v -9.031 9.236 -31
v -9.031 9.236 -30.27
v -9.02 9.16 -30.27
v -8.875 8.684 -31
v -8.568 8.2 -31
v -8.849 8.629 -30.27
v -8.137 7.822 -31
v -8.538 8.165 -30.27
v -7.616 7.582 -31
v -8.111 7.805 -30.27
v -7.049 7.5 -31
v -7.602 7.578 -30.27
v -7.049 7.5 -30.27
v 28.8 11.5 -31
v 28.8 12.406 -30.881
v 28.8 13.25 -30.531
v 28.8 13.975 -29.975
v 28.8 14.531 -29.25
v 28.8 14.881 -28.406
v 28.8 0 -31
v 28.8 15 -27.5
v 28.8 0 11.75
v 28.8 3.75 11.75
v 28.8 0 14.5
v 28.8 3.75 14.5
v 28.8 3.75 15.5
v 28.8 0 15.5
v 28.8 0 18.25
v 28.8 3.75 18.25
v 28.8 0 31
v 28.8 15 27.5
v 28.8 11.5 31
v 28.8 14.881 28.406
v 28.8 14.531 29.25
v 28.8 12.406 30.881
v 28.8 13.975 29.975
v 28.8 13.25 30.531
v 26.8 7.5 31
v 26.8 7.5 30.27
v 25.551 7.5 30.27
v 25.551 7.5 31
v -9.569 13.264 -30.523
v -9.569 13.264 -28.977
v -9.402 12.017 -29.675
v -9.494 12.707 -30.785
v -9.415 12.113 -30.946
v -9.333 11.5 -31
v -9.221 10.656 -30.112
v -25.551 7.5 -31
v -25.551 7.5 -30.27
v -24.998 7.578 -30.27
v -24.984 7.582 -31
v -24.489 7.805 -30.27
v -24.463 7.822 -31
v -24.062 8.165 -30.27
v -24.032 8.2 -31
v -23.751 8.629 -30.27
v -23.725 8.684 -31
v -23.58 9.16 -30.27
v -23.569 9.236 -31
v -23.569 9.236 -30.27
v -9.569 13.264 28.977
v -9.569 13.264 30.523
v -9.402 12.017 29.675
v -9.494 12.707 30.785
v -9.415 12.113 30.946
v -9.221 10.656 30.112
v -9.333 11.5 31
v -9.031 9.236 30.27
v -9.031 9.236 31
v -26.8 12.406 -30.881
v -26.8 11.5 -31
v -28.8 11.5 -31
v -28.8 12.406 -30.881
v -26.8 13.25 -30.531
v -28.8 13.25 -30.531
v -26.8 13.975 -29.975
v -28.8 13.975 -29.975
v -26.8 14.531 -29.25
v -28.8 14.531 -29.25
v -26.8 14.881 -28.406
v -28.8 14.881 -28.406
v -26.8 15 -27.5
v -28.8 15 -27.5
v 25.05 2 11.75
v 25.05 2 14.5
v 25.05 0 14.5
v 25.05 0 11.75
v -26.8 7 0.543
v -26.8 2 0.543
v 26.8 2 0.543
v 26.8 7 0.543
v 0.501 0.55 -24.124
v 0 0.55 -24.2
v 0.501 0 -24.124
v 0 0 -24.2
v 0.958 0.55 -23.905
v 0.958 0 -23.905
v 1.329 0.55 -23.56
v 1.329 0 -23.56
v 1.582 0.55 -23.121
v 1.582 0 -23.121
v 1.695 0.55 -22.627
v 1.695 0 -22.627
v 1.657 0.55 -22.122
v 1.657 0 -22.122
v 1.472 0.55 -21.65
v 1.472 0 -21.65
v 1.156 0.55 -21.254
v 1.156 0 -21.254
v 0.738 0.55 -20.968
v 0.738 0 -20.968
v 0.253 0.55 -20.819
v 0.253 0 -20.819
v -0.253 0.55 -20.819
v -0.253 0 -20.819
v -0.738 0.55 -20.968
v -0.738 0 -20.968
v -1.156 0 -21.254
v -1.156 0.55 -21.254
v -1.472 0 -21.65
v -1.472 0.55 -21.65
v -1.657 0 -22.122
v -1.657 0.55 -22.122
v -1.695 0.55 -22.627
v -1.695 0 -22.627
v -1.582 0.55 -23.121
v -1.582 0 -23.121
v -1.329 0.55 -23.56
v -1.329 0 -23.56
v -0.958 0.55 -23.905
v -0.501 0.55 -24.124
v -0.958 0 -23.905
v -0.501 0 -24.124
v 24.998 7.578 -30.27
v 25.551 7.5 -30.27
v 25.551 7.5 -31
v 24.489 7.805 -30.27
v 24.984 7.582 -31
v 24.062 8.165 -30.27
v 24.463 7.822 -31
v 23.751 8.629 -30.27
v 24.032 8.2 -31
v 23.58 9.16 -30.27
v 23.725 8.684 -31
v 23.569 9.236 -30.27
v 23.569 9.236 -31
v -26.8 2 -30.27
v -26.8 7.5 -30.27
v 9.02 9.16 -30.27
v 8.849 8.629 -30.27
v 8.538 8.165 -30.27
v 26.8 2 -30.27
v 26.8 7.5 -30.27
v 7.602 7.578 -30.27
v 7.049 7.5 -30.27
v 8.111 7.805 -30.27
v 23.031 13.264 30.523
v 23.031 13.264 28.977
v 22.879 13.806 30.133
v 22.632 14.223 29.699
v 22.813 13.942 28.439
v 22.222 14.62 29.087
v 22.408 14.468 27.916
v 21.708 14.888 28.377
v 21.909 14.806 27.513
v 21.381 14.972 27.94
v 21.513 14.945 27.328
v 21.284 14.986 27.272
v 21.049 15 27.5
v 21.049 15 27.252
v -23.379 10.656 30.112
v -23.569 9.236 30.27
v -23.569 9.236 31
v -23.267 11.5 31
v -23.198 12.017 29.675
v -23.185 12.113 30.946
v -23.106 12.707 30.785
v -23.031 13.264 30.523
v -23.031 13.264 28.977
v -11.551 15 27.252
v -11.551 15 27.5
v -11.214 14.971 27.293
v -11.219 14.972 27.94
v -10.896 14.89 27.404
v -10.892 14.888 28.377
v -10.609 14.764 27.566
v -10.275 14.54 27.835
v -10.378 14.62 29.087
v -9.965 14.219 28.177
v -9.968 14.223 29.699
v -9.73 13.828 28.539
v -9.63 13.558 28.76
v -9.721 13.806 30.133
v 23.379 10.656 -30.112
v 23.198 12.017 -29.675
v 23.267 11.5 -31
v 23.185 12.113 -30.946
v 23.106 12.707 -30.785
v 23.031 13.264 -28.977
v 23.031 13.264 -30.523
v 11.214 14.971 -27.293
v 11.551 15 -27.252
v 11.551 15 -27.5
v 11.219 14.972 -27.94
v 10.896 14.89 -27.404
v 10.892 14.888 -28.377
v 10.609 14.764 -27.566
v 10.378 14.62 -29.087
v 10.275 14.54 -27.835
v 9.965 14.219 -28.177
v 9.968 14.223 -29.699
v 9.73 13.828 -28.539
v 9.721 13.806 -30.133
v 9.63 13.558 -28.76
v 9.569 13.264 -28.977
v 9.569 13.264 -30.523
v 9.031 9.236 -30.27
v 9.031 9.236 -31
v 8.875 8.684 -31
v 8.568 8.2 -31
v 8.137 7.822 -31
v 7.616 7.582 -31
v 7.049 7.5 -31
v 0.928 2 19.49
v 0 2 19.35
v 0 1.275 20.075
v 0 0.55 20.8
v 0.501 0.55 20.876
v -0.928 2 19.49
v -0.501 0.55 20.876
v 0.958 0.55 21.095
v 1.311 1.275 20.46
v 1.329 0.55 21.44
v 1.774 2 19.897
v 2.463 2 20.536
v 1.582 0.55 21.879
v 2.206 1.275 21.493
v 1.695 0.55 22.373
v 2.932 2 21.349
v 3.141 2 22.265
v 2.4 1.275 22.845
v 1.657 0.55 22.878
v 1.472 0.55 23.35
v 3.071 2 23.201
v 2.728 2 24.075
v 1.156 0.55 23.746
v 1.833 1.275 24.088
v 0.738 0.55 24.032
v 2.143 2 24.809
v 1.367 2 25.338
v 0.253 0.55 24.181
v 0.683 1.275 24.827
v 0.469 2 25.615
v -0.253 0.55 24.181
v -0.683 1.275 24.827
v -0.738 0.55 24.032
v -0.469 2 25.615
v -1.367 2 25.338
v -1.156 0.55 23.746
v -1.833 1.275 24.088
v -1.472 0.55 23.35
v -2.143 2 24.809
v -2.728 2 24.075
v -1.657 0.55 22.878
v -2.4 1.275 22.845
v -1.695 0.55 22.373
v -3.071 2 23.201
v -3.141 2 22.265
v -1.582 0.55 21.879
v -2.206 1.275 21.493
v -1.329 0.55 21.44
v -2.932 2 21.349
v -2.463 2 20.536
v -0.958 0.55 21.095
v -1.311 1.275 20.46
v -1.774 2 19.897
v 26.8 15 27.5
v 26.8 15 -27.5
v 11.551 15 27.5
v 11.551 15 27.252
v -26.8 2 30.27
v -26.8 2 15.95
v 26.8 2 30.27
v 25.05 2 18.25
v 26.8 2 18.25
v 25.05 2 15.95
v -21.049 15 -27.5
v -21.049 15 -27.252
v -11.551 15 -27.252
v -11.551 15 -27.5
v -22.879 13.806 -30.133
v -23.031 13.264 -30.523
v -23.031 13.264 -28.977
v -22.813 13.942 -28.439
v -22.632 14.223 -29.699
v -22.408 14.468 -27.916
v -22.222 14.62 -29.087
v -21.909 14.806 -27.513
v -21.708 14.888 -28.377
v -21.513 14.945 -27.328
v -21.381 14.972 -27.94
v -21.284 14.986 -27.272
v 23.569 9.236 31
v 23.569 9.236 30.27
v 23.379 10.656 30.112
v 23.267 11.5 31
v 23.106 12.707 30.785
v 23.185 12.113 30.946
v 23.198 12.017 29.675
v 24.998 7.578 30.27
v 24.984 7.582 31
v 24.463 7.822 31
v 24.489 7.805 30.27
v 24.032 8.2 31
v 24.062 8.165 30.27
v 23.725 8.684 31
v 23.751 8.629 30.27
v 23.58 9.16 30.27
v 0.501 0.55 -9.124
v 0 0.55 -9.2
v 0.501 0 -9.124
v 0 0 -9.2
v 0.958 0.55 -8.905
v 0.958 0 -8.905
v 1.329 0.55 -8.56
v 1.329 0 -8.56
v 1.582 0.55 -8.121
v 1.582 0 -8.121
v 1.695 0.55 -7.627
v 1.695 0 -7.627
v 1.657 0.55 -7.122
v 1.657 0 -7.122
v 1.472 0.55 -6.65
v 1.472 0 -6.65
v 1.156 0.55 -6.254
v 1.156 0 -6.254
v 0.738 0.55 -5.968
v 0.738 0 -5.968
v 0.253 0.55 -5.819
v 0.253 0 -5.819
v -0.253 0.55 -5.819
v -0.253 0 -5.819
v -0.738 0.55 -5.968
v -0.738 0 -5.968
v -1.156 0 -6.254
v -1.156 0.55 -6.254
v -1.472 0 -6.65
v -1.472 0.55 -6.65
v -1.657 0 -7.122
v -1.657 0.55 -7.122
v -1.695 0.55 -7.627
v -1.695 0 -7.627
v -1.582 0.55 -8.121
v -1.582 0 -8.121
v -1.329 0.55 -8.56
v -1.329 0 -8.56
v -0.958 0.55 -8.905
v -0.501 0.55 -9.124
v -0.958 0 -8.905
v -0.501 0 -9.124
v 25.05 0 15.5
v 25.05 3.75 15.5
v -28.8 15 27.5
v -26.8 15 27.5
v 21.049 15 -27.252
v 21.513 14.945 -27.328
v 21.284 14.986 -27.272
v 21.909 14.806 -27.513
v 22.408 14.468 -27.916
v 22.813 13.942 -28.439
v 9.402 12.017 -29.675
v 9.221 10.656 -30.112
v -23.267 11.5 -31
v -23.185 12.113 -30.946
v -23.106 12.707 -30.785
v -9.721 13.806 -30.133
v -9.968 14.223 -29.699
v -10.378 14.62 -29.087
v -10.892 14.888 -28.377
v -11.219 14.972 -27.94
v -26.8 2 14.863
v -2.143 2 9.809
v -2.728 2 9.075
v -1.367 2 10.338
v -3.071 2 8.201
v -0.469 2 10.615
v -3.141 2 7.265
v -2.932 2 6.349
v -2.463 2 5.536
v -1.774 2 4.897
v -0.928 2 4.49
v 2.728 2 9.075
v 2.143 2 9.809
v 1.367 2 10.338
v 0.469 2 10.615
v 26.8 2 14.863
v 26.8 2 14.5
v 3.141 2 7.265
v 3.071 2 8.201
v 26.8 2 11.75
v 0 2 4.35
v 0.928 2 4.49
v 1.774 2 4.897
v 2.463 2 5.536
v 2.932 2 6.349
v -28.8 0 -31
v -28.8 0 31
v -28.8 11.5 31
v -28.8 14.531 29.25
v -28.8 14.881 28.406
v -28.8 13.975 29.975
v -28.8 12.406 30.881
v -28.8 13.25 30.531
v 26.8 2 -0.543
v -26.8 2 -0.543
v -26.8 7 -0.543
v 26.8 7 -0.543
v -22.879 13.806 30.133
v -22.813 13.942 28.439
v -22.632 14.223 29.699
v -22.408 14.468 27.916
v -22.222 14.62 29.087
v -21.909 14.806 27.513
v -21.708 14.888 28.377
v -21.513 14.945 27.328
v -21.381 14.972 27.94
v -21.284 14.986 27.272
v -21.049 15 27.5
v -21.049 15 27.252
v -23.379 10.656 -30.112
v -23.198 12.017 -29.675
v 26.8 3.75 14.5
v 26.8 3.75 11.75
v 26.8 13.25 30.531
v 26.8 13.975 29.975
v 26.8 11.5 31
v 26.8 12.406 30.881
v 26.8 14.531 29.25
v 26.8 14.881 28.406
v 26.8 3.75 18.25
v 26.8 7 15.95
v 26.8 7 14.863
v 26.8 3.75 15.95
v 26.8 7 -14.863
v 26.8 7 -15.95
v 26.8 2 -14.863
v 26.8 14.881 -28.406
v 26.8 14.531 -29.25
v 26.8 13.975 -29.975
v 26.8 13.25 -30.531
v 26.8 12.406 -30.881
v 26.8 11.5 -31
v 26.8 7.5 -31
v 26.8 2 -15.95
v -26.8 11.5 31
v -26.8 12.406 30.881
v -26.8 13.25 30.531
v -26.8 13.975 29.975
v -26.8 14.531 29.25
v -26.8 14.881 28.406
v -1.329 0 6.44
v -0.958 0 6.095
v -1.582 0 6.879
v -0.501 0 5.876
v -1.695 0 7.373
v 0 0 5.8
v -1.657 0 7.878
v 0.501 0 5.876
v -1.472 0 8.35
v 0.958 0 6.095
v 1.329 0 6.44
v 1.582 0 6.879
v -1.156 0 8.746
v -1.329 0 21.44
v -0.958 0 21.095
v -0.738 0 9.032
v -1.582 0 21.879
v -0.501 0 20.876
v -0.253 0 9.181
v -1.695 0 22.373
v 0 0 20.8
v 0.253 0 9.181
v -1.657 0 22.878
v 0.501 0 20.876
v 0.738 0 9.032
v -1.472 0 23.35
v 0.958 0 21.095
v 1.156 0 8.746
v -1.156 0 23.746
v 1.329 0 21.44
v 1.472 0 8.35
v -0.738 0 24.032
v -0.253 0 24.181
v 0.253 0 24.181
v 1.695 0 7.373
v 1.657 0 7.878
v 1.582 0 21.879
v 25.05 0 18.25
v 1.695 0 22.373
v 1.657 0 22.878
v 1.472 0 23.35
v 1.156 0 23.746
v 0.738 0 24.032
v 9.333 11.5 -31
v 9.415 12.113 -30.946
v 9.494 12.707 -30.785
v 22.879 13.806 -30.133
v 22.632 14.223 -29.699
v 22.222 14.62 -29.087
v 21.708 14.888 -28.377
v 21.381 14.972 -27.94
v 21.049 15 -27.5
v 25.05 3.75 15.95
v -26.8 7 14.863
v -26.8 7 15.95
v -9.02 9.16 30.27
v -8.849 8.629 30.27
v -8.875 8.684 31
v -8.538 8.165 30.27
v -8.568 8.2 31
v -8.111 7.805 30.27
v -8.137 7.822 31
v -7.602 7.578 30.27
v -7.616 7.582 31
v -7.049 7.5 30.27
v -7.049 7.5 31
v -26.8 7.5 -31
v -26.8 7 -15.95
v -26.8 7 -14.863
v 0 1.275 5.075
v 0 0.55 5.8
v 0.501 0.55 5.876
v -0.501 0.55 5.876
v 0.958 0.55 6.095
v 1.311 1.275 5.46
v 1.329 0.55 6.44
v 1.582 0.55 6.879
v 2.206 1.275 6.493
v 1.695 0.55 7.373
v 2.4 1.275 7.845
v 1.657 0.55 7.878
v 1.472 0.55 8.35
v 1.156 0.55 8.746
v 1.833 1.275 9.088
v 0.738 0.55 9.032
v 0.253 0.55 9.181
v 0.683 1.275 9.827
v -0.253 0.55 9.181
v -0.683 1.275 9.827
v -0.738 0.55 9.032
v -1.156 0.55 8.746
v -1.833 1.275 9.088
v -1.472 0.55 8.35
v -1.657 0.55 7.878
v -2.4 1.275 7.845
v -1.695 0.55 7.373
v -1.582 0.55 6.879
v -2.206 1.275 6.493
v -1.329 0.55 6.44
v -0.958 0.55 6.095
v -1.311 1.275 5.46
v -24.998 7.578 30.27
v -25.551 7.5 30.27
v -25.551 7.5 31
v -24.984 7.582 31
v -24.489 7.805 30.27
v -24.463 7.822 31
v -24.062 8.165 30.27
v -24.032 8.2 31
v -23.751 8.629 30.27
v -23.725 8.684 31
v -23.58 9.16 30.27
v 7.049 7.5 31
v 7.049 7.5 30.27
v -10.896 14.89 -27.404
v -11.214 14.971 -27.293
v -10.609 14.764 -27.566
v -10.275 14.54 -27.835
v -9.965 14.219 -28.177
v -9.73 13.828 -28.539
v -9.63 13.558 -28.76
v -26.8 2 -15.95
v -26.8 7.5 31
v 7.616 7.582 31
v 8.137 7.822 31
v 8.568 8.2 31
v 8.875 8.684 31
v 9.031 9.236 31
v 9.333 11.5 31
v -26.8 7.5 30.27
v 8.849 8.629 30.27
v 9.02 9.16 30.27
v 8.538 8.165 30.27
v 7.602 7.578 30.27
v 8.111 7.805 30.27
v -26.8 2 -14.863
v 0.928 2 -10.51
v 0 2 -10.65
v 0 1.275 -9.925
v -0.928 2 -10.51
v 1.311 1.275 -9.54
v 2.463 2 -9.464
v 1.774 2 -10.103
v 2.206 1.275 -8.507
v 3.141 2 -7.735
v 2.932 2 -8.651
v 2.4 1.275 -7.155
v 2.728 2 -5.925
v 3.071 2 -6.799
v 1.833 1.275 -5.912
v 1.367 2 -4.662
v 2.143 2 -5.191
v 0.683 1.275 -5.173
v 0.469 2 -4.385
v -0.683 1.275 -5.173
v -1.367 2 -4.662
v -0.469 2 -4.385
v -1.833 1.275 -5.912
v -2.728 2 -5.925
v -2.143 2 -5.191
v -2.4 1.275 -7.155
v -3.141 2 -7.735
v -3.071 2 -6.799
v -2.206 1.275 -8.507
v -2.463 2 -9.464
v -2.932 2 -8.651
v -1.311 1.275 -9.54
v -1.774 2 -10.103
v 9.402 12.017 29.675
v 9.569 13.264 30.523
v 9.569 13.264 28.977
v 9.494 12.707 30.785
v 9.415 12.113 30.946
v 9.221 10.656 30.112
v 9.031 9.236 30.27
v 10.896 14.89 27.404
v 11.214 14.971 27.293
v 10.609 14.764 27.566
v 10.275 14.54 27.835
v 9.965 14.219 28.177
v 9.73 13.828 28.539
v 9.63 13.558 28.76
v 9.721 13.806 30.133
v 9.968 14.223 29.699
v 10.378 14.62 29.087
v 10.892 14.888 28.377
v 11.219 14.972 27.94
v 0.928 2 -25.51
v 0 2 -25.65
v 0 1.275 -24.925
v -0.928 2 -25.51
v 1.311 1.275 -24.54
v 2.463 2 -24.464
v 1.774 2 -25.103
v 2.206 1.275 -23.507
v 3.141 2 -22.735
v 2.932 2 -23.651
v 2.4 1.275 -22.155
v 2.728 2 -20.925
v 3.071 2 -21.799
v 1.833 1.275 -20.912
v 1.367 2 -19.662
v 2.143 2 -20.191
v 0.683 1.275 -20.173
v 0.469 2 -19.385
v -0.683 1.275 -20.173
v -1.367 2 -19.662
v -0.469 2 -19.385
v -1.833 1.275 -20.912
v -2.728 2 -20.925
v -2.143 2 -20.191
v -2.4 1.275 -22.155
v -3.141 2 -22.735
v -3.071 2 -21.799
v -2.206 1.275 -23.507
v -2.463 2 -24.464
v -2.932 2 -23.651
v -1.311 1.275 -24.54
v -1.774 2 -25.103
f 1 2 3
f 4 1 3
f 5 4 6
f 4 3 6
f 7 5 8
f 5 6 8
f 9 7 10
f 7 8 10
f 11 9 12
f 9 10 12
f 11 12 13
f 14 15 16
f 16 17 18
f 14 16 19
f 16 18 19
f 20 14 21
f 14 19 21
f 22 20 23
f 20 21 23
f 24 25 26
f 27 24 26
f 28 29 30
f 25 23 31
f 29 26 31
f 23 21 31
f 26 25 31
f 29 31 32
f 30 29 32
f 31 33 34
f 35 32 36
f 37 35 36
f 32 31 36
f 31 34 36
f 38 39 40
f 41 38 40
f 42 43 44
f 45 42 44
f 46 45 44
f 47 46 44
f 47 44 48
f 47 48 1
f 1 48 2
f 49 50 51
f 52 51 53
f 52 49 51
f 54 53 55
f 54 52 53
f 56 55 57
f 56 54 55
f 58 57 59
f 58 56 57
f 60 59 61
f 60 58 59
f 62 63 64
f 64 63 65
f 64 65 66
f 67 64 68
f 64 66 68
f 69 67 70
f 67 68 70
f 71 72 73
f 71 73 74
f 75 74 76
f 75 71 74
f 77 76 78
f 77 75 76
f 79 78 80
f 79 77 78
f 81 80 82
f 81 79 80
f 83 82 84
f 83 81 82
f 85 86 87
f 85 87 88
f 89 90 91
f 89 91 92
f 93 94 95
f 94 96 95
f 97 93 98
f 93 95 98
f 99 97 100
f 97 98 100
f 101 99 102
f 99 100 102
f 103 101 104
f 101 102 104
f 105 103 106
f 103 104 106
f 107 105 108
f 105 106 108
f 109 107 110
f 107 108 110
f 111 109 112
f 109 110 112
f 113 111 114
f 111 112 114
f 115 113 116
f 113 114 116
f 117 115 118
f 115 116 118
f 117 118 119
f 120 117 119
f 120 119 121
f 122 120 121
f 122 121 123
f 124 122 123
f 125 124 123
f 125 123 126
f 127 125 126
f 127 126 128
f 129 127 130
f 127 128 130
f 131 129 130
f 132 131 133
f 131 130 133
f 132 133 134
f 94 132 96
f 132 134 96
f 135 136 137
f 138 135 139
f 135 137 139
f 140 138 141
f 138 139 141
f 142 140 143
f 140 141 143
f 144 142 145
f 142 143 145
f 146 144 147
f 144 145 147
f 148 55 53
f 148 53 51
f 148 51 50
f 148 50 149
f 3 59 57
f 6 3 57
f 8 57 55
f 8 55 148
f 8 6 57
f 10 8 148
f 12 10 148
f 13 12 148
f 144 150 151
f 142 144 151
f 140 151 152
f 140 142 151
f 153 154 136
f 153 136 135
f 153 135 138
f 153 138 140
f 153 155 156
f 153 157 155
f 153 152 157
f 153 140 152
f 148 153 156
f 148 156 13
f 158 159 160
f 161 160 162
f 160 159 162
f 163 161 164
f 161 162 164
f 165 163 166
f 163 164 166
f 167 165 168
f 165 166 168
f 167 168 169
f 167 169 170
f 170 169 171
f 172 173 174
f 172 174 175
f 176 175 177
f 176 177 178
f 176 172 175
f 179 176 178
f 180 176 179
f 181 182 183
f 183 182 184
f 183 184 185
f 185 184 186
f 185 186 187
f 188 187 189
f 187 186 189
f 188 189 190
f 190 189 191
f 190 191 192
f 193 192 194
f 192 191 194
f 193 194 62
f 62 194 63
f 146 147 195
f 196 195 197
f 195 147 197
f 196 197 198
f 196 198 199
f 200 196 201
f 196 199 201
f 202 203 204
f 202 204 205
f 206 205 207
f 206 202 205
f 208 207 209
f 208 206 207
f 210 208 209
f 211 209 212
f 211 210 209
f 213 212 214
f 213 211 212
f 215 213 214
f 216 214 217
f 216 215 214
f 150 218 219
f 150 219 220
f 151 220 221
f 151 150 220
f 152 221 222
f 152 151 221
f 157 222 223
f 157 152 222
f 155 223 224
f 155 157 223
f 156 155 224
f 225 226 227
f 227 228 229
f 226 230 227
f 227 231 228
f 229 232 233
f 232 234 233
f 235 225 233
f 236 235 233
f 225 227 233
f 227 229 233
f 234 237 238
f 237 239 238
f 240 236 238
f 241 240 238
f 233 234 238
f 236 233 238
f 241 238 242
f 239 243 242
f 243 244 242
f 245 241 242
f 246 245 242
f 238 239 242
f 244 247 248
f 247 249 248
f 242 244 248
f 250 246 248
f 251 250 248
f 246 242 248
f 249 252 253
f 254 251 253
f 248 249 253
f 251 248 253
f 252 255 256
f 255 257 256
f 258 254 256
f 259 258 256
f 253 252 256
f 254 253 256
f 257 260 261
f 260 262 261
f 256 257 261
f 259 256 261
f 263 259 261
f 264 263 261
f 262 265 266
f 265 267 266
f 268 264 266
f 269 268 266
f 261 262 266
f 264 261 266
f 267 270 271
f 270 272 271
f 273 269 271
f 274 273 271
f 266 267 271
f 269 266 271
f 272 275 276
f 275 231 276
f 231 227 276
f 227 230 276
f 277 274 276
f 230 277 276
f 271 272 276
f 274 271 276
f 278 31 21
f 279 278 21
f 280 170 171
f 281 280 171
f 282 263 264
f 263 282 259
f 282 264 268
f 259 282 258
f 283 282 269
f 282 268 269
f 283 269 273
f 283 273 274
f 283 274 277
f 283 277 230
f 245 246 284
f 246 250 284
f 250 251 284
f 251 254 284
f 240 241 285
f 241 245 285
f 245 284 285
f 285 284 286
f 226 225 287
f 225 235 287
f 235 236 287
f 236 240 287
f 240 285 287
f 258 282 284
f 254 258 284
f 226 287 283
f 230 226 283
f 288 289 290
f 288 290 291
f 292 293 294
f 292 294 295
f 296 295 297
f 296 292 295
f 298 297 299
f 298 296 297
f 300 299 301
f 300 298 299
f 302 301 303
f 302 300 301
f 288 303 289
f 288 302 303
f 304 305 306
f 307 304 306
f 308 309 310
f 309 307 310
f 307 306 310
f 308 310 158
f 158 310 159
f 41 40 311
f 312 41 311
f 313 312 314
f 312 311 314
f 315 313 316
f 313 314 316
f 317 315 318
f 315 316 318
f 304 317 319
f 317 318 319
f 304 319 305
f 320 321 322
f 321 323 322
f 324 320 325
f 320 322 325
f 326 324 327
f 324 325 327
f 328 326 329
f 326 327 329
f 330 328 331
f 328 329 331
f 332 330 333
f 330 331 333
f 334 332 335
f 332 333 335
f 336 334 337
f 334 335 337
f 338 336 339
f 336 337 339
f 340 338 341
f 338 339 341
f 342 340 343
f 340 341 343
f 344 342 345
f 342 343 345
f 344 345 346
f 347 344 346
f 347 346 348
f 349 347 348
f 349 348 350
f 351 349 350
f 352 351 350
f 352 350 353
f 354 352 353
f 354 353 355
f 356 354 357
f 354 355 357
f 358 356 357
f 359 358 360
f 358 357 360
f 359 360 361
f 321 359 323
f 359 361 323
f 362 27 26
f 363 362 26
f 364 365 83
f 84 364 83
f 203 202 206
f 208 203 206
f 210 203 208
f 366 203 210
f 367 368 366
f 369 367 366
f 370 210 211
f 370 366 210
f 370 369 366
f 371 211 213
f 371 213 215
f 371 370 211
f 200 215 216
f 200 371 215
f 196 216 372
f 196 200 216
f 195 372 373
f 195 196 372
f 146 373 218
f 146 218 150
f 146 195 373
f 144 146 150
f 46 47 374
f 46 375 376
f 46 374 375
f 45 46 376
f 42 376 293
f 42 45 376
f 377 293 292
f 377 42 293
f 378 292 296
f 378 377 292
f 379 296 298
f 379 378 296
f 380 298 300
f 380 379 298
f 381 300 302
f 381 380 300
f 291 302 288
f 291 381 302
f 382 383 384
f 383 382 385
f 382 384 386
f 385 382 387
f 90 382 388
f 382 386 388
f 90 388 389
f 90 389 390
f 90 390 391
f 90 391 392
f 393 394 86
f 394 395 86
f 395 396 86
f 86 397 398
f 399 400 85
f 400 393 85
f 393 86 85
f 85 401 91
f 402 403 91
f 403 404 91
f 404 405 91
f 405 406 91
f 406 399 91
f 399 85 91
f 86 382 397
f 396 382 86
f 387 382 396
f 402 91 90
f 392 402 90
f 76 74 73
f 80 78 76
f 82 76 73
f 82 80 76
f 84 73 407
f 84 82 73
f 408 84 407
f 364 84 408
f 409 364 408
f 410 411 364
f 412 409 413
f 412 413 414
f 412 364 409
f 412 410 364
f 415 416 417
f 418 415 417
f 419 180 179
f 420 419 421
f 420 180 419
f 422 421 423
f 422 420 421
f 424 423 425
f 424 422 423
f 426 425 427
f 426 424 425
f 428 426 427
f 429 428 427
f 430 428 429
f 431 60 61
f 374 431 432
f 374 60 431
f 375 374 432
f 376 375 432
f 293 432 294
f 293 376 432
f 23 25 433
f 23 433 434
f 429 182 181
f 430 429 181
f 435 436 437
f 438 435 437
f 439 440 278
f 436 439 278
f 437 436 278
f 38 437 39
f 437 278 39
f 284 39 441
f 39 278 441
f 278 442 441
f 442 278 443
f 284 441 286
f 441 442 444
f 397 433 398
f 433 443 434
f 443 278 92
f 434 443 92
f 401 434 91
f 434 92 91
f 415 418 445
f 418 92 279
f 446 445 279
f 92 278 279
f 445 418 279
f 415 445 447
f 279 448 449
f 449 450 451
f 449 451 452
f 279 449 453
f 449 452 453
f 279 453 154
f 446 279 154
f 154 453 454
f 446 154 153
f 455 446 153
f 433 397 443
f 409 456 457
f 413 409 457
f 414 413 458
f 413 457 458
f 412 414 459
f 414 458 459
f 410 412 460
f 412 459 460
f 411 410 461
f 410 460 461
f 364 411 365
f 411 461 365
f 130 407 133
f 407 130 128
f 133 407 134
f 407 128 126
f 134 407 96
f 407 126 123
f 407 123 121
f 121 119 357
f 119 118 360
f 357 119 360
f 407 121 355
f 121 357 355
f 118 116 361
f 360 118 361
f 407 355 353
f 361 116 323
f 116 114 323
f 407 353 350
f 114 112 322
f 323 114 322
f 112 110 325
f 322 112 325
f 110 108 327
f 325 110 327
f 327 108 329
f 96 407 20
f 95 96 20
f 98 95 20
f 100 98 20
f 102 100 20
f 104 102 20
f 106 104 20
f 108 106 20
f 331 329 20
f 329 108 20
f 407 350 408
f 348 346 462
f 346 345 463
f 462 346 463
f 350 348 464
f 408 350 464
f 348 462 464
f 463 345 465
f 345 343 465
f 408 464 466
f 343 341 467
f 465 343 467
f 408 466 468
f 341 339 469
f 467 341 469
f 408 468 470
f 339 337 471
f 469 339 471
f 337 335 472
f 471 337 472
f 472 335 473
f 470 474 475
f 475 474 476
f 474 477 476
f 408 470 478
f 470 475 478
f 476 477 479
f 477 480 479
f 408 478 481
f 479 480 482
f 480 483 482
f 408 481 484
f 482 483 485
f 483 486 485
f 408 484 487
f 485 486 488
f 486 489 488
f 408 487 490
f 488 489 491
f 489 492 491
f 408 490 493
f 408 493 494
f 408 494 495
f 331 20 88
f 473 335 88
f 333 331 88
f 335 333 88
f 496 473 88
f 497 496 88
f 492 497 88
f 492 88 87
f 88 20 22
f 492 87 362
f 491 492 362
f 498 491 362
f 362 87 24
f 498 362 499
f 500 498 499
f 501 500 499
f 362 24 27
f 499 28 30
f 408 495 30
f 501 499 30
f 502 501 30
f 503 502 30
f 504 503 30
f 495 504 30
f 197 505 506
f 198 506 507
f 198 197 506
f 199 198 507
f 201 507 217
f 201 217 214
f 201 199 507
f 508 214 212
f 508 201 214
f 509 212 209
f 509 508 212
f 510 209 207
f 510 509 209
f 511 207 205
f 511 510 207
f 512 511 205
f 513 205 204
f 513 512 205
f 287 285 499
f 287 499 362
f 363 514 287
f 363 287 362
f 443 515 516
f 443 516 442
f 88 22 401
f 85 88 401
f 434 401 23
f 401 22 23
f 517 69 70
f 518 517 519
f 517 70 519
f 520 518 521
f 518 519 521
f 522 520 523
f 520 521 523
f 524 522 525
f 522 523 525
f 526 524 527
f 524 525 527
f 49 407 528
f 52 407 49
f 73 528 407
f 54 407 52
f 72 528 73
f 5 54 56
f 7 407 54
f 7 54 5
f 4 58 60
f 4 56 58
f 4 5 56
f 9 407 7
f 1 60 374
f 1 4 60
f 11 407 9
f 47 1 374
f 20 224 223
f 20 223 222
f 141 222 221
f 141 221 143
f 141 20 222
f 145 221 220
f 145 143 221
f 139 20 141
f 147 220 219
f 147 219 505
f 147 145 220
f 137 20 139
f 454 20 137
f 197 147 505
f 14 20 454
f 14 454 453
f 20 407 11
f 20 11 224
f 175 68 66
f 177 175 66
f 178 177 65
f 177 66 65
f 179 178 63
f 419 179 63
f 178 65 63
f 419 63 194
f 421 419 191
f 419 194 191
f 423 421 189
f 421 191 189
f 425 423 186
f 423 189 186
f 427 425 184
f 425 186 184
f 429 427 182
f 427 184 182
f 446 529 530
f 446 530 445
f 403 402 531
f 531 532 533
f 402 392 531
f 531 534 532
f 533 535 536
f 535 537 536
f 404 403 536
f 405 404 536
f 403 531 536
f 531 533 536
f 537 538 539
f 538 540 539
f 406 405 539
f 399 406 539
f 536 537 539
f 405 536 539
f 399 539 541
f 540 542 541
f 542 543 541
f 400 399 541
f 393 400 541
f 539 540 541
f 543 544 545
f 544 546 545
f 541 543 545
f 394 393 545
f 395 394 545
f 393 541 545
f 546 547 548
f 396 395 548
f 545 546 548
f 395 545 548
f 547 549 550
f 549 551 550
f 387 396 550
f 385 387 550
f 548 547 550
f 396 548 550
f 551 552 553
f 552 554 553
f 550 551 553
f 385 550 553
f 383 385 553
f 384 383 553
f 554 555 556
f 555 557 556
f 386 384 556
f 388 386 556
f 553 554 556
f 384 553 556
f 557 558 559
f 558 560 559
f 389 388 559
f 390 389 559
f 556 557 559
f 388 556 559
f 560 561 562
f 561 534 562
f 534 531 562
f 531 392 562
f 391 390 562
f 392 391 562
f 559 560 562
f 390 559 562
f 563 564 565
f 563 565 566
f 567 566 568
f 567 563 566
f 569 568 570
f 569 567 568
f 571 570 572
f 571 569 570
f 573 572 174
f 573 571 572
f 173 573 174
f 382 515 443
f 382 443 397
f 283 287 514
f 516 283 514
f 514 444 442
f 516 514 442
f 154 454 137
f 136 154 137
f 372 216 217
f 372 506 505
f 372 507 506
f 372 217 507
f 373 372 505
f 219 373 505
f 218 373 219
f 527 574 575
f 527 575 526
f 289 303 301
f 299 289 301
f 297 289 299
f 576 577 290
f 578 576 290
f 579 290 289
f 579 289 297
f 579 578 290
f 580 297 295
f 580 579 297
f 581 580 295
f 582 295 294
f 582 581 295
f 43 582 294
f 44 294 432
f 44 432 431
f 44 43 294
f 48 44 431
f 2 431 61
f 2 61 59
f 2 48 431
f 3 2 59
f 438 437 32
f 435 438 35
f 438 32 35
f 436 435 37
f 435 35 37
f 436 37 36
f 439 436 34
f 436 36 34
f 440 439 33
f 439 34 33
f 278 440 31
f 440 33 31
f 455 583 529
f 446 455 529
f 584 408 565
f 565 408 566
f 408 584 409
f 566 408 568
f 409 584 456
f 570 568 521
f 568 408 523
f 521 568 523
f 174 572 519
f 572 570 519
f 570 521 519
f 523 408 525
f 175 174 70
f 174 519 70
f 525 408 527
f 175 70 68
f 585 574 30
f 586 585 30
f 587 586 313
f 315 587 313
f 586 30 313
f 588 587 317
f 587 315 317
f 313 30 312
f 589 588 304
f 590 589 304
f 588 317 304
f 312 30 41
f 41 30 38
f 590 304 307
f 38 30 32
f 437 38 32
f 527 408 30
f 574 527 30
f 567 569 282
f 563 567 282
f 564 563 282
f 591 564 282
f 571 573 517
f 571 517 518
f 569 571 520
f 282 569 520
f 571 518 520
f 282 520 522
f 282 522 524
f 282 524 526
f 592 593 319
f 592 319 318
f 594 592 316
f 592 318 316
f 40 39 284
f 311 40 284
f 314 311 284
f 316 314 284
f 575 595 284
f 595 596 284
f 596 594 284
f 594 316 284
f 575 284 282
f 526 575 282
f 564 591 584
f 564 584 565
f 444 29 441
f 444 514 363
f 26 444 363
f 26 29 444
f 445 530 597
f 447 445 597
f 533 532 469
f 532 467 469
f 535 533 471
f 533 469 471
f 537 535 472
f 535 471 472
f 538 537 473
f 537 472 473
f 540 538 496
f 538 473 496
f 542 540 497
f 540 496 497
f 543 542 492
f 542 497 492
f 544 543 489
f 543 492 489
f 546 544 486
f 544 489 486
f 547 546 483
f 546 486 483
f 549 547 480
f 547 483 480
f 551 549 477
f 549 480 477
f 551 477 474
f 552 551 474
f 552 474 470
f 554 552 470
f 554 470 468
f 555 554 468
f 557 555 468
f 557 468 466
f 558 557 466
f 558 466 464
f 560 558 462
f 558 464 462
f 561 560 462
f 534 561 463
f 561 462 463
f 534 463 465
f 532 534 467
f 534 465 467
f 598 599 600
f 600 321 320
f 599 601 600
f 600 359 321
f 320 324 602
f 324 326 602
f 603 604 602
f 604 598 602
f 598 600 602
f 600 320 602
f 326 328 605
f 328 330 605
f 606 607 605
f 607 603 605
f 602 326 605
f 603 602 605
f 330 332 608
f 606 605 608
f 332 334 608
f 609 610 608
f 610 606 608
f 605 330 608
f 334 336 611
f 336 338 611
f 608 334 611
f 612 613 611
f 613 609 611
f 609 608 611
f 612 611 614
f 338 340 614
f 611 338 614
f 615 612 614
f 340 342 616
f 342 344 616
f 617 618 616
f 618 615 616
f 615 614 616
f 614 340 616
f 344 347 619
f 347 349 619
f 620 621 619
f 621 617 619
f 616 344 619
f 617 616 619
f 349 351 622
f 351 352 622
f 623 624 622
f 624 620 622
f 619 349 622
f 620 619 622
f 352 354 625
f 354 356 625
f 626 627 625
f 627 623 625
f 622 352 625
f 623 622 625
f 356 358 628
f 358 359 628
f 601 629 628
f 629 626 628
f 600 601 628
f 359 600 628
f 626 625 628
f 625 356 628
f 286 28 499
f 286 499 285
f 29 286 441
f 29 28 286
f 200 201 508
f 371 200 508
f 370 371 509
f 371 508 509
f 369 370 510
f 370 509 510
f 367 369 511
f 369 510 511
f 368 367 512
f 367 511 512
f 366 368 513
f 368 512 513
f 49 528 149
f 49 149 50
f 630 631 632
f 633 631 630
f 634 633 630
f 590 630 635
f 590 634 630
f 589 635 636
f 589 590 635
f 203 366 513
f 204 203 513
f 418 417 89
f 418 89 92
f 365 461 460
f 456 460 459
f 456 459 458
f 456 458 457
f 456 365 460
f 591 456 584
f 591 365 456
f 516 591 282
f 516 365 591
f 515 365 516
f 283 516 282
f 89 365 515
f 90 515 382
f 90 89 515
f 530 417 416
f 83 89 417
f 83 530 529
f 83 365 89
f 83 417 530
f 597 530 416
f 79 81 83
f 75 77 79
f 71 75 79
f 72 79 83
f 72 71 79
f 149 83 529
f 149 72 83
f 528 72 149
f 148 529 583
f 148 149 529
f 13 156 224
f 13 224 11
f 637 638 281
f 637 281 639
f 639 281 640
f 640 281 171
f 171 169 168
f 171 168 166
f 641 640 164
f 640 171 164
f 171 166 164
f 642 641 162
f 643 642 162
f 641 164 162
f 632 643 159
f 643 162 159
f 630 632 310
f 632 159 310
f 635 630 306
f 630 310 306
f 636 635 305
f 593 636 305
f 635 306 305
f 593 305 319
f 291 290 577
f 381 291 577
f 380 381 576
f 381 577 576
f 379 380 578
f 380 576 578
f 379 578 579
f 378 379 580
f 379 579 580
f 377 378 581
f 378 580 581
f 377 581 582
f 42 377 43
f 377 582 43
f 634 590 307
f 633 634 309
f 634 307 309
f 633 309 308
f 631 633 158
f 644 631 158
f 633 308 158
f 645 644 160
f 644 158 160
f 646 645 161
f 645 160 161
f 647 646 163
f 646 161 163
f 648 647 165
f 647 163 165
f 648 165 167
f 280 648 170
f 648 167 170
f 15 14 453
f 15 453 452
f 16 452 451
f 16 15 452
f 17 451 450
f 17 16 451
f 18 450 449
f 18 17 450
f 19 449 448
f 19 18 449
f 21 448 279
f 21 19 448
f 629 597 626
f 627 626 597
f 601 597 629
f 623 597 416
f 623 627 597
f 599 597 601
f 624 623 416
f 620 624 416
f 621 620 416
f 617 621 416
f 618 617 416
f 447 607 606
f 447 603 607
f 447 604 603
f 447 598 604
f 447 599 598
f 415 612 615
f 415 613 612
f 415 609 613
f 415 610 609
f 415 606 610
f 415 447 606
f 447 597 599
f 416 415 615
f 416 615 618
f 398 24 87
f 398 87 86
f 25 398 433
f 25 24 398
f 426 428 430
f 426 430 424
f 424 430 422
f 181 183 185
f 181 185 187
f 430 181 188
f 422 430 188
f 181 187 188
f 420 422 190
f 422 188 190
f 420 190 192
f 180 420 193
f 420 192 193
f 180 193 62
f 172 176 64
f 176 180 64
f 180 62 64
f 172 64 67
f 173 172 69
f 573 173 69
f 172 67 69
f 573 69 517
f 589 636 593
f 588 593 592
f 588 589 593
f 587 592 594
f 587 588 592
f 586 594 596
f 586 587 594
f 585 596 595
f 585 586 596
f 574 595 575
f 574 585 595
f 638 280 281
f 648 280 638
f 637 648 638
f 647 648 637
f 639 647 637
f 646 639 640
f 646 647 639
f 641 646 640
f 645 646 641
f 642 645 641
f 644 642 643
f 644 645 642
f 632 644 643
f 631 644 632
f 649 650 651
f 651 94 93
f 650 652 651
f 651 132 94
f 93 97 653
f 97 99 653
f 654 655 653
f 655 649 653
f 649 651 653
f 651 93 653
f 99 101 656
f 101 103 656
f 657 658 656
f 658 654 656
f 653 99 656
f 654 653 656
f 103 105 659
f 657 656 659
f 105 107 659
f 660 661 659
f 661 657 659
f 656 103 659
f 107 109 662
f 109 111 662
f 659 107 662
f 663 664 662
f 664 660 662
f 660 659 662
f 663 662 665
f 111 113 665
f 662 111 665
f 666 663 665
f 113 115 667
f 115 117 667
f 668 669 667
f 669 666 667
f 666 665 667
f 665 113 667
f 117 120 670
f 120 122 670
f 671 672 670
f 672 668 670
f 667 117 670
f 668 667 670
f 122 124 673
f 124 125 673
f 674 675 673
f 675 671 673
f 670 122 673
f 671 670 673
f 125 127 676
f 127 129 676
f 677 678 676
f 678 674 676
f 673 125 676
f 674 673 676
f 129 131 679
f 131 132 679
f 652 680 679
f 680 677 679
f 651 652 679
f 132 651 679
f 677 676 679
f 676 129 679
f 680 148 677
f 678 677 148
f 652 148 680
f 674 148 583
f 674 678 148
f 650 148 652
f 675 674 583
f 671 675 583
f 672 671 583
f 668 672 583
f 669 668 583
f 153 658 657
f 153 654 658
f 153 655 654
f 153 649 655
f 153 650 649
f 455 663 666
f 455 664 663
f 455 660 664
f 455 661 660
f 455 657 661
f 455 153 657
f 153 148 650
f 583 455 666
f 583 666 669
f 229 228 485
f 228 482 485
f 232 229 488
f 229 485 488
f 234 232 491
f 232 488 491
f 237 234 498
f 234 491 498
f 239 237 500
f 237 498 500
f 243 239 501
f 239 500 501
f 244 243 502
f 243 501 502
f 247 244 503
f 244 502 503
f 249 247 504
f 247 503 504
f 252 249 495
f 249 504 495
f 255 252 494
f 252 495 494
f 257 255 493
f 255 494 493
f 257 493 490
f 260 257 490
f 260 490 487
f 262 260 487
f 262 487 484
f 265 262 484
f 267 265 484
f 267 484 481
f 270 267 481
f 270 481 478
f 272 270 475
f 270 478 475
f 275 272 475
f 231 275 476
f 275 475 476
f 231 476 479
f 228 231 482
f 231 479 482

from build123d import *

# Parameters (mm, degrees)
BOSS_EXTRUDE1_DEPTH                             = 28.8
SKETCH2_W                                       = 2.75
SKETCH2_H                                       = 3.75
CUT_EXTRUDE1_DEPTH                              = 3.75
CUT_EXTRUDE2_START                              = -2
CUT_EXTRUDE2_DEPTH                              = 53.6
SKETCH4_W                                       = 53.6
SKETCH4_H                                       = 54.504926328
CUT_EXTRUDE3_DEPTH                              = 8
CSK_FOR_M3_FLAT_HEAD_MACHINE_SCREW1_D           = 3.4
CSK_FOR_M3_FLAT_HEAD_MACHINE_SCREW1_DEPTH       = 7.874
CSK_FOR_M3_FLAT_HEAD_MACHINE_SCREW1_CSINK_D     = 6.3
CSK_FOR_M3_FLAT_HEAD_MACHINE_SCREW1_CSINK_ANGLE = 90
CSK_FOR_M3_FLAT_HEAD_MACHINE_SCREW1_TIP         = 1.021463052
CUT_EXTRUDE4_DEPTH                              = 45.893652113


with BuildPart() as part:
    # Sketch1 → Boss-Extrude1 (new, symmetric)
    with BuildSketch(Plane(origin=(0, 0, 0), x_dir=(0, 0, -1), z_dir=(1, 0, 0))):
        with BuildLine():
            Line((0, 0), (31, 0))
            Line((31, 0), (31, 11.5))
            ThreePointArc((31, 11.5), (29.974873734, 13.974873734), (27.5, 15))
            Line((27.5, 15), (0, 15))
            Line((0, 15), (0, 0))
        make_face()
    boss_extrude1 = extrude(amount=BOSS_EXTRUDE1_DEPTH, both=True)

    # Mirror1: Boss-Extrude1 across plane
    add(boss_extrude1.mirror(Plane(origin=(28.8, 15, 0), x_dir=(1, 0, 0), z_dir=(0, 0, -1))))

    # Sketch2 → Cut-Extrude1 (cut)
    with BuildSketch(Plane(origin=(28.8, 0, 0), x_dir=(0, 0, -1), z_dir=(1, 0, 0))):
        with Locations((-16.8750001, 1.875)):
            Rectangle(SKETCH2_W, SKETCH2_H)
        with Locations((-13.1250001, 1.875)):
            Rectangle(SKETCH2_W, SKETCH2_H)
    extrude(amount=-CUT_EXTRUDE1_DEPTH, mode=Mode.SUBTRACT)

    # Sketch3 → Cut-Extrude2 (cut)
    with BuildSketch(Plane(origin=(28.8, 0, 0), x_dir=(0, 0, -1), z_dir=(1, 0, 0)).offset(CUT_EXTRUDE2_START)):
        with BuildLine():
            Line((-30.270000062, 9.160000031), (-30.270000062, 2))
            Line((-30.270000062, 2), (-15.95, 2))
            Line((-15.95, 2), (-15.95, 9.160000031))
            ThreePointArc((-15.95, 9.160000031), (-23.110000031, 16.320000062), (-30.270000062, 9.160000031))
        make_face()
        with BuildLine():
            Line((-14.863333375, 9.160000031), (-14.863333375, 2))
            Line((-14.863333375, 2), (-0.543333313, 2))
            Line((-0.543333313, 2), (-0.543333313, 9.160000031))
            ThreePointArc((-0.543333313, 9.160000031), (-7.703333344, 16.320000062), (-14.863333375, 9.160000031))
        make_face()
    cut_extrude2 = extrude(amount=-CUT_EXTRUDE2_DEPTH, mode=Mode.SUBTRACT)

    # Mirror2: Cut-Extrude2 across plane
    add(cut_extrude2.mirror(Plane.XY), mode=Mode.SUBTRACT)

    # Sketch4 → Cut-Extrude3 (cut)
    with BuildSketch(Plane(origin=(0, 15, 0), x_dir=(1, 0, 0), z_dir=(0, 1, 0))):
        Rectangle(SKETCH4_W, SKETCH4_H)
    extrude(amount=-CUT_EXTRUDE3_DEPTH, mode=Mode.SUBTRACT)

    # CSK for M3 Flat Head Machine Screw1
    with Locations(Plane(origin=(0, 2, -22.5), x_dir=(0, 0, 1), z_dir=(0, 1, 0))):
        with Locations((0, 0), (15, 0), (30, 0), (45, 0)):
            CounterSinkHole(CSK_FOR_M3_FLAT_HEAD_MACHINE_SCREW1_D / 2, CSK_FOR_M3_FLAT_HEAD_MACHINE_SCREW1_CSINK_D / 2, depth=CSK_FOR_M3_FLAT_HEAD_MACHINE_SCREW1_DEPTH, counter_sink_angle=CSK_FOR_M3_FLAT_HEAD_MACHINE_SCREW1_CSINK_ANGLE)
            with Locations((0, 0, -(CSK_FOR_M3_FLAT_HEAD_MACHINE_SCREW1_DEPTH + CSK_FOR_M3_FLAT_HEAD_MACHINE_SCREW1_TIP / 2))):  # 118° drill point
                Cone(0, CSK_FOR_M3_FLAT_HEAD_MACHINE_SCREW1_D / 2, CSK_FOR_M3_FLAT_HEAD_MACHINE_SCREW1_TIP, mode=Mode.SUBTRACT)

    # Sketch7 → Cut-Extrude4 (cut, symmetric)
    with BuildSketch(Plane.XY):
        with BuildLine():
            Line((-26.8, 15), (-26.8, 7.5))
            Line((-26.8, 7.5), (-25.551032793, 7.5))
            ThreePointArc((-25.551032793, 7.5), (-24.233583531, 7.995231765), (-23.568576992, 9.23567256))
            Line((-23.568576992, 9.23567256), (-23.031423008, 13.26432744))
            ThreePointArc((-23.031423008, 13.26432744), (-22.366416469, 14.504768235), (-21.048967207, 15))
            Line((-21.048967207, 15), (-22.8, 15))
            Line((-22.8, 15), (-26.8, 15))
        make_face()
        with BuildLine():
            Line((-9.568576992, 13.26432744), (-9.031423008, 9.23567256))
            ThreePointArc((-9.031423008, 9.23567256), (-8.366416469, 7.995231765), (-7.048967207, 7.5))
            Line((-7.048967207, 7.5), (0, 7.5))
            Line((0, 7.5), (0, 15))
            Line((0, 15), (-9.8, 15))
            Line((-9.8, 15), (-11.551032793, 15))
            ThreePointArc((-11.551032793, 15), (-10.233583531, 14.504768235), (-9.568576992, 13.26432744))
        make_face()
    cut_extrude4 = extrude(amount=CUT_EXTRUDE4_DEPTH, both=True, mode=Mode.SUBTRACT)

    # Mirror3: Cut-Extrude4 across plane
    add(cut_extrude4.mirror(Plane(origin=(0, 0, 0), x_dir=(0, 0, 1), z_dir=(1, 0, 0))), mode=Mode.SUBTRACT)


solid = part.part
